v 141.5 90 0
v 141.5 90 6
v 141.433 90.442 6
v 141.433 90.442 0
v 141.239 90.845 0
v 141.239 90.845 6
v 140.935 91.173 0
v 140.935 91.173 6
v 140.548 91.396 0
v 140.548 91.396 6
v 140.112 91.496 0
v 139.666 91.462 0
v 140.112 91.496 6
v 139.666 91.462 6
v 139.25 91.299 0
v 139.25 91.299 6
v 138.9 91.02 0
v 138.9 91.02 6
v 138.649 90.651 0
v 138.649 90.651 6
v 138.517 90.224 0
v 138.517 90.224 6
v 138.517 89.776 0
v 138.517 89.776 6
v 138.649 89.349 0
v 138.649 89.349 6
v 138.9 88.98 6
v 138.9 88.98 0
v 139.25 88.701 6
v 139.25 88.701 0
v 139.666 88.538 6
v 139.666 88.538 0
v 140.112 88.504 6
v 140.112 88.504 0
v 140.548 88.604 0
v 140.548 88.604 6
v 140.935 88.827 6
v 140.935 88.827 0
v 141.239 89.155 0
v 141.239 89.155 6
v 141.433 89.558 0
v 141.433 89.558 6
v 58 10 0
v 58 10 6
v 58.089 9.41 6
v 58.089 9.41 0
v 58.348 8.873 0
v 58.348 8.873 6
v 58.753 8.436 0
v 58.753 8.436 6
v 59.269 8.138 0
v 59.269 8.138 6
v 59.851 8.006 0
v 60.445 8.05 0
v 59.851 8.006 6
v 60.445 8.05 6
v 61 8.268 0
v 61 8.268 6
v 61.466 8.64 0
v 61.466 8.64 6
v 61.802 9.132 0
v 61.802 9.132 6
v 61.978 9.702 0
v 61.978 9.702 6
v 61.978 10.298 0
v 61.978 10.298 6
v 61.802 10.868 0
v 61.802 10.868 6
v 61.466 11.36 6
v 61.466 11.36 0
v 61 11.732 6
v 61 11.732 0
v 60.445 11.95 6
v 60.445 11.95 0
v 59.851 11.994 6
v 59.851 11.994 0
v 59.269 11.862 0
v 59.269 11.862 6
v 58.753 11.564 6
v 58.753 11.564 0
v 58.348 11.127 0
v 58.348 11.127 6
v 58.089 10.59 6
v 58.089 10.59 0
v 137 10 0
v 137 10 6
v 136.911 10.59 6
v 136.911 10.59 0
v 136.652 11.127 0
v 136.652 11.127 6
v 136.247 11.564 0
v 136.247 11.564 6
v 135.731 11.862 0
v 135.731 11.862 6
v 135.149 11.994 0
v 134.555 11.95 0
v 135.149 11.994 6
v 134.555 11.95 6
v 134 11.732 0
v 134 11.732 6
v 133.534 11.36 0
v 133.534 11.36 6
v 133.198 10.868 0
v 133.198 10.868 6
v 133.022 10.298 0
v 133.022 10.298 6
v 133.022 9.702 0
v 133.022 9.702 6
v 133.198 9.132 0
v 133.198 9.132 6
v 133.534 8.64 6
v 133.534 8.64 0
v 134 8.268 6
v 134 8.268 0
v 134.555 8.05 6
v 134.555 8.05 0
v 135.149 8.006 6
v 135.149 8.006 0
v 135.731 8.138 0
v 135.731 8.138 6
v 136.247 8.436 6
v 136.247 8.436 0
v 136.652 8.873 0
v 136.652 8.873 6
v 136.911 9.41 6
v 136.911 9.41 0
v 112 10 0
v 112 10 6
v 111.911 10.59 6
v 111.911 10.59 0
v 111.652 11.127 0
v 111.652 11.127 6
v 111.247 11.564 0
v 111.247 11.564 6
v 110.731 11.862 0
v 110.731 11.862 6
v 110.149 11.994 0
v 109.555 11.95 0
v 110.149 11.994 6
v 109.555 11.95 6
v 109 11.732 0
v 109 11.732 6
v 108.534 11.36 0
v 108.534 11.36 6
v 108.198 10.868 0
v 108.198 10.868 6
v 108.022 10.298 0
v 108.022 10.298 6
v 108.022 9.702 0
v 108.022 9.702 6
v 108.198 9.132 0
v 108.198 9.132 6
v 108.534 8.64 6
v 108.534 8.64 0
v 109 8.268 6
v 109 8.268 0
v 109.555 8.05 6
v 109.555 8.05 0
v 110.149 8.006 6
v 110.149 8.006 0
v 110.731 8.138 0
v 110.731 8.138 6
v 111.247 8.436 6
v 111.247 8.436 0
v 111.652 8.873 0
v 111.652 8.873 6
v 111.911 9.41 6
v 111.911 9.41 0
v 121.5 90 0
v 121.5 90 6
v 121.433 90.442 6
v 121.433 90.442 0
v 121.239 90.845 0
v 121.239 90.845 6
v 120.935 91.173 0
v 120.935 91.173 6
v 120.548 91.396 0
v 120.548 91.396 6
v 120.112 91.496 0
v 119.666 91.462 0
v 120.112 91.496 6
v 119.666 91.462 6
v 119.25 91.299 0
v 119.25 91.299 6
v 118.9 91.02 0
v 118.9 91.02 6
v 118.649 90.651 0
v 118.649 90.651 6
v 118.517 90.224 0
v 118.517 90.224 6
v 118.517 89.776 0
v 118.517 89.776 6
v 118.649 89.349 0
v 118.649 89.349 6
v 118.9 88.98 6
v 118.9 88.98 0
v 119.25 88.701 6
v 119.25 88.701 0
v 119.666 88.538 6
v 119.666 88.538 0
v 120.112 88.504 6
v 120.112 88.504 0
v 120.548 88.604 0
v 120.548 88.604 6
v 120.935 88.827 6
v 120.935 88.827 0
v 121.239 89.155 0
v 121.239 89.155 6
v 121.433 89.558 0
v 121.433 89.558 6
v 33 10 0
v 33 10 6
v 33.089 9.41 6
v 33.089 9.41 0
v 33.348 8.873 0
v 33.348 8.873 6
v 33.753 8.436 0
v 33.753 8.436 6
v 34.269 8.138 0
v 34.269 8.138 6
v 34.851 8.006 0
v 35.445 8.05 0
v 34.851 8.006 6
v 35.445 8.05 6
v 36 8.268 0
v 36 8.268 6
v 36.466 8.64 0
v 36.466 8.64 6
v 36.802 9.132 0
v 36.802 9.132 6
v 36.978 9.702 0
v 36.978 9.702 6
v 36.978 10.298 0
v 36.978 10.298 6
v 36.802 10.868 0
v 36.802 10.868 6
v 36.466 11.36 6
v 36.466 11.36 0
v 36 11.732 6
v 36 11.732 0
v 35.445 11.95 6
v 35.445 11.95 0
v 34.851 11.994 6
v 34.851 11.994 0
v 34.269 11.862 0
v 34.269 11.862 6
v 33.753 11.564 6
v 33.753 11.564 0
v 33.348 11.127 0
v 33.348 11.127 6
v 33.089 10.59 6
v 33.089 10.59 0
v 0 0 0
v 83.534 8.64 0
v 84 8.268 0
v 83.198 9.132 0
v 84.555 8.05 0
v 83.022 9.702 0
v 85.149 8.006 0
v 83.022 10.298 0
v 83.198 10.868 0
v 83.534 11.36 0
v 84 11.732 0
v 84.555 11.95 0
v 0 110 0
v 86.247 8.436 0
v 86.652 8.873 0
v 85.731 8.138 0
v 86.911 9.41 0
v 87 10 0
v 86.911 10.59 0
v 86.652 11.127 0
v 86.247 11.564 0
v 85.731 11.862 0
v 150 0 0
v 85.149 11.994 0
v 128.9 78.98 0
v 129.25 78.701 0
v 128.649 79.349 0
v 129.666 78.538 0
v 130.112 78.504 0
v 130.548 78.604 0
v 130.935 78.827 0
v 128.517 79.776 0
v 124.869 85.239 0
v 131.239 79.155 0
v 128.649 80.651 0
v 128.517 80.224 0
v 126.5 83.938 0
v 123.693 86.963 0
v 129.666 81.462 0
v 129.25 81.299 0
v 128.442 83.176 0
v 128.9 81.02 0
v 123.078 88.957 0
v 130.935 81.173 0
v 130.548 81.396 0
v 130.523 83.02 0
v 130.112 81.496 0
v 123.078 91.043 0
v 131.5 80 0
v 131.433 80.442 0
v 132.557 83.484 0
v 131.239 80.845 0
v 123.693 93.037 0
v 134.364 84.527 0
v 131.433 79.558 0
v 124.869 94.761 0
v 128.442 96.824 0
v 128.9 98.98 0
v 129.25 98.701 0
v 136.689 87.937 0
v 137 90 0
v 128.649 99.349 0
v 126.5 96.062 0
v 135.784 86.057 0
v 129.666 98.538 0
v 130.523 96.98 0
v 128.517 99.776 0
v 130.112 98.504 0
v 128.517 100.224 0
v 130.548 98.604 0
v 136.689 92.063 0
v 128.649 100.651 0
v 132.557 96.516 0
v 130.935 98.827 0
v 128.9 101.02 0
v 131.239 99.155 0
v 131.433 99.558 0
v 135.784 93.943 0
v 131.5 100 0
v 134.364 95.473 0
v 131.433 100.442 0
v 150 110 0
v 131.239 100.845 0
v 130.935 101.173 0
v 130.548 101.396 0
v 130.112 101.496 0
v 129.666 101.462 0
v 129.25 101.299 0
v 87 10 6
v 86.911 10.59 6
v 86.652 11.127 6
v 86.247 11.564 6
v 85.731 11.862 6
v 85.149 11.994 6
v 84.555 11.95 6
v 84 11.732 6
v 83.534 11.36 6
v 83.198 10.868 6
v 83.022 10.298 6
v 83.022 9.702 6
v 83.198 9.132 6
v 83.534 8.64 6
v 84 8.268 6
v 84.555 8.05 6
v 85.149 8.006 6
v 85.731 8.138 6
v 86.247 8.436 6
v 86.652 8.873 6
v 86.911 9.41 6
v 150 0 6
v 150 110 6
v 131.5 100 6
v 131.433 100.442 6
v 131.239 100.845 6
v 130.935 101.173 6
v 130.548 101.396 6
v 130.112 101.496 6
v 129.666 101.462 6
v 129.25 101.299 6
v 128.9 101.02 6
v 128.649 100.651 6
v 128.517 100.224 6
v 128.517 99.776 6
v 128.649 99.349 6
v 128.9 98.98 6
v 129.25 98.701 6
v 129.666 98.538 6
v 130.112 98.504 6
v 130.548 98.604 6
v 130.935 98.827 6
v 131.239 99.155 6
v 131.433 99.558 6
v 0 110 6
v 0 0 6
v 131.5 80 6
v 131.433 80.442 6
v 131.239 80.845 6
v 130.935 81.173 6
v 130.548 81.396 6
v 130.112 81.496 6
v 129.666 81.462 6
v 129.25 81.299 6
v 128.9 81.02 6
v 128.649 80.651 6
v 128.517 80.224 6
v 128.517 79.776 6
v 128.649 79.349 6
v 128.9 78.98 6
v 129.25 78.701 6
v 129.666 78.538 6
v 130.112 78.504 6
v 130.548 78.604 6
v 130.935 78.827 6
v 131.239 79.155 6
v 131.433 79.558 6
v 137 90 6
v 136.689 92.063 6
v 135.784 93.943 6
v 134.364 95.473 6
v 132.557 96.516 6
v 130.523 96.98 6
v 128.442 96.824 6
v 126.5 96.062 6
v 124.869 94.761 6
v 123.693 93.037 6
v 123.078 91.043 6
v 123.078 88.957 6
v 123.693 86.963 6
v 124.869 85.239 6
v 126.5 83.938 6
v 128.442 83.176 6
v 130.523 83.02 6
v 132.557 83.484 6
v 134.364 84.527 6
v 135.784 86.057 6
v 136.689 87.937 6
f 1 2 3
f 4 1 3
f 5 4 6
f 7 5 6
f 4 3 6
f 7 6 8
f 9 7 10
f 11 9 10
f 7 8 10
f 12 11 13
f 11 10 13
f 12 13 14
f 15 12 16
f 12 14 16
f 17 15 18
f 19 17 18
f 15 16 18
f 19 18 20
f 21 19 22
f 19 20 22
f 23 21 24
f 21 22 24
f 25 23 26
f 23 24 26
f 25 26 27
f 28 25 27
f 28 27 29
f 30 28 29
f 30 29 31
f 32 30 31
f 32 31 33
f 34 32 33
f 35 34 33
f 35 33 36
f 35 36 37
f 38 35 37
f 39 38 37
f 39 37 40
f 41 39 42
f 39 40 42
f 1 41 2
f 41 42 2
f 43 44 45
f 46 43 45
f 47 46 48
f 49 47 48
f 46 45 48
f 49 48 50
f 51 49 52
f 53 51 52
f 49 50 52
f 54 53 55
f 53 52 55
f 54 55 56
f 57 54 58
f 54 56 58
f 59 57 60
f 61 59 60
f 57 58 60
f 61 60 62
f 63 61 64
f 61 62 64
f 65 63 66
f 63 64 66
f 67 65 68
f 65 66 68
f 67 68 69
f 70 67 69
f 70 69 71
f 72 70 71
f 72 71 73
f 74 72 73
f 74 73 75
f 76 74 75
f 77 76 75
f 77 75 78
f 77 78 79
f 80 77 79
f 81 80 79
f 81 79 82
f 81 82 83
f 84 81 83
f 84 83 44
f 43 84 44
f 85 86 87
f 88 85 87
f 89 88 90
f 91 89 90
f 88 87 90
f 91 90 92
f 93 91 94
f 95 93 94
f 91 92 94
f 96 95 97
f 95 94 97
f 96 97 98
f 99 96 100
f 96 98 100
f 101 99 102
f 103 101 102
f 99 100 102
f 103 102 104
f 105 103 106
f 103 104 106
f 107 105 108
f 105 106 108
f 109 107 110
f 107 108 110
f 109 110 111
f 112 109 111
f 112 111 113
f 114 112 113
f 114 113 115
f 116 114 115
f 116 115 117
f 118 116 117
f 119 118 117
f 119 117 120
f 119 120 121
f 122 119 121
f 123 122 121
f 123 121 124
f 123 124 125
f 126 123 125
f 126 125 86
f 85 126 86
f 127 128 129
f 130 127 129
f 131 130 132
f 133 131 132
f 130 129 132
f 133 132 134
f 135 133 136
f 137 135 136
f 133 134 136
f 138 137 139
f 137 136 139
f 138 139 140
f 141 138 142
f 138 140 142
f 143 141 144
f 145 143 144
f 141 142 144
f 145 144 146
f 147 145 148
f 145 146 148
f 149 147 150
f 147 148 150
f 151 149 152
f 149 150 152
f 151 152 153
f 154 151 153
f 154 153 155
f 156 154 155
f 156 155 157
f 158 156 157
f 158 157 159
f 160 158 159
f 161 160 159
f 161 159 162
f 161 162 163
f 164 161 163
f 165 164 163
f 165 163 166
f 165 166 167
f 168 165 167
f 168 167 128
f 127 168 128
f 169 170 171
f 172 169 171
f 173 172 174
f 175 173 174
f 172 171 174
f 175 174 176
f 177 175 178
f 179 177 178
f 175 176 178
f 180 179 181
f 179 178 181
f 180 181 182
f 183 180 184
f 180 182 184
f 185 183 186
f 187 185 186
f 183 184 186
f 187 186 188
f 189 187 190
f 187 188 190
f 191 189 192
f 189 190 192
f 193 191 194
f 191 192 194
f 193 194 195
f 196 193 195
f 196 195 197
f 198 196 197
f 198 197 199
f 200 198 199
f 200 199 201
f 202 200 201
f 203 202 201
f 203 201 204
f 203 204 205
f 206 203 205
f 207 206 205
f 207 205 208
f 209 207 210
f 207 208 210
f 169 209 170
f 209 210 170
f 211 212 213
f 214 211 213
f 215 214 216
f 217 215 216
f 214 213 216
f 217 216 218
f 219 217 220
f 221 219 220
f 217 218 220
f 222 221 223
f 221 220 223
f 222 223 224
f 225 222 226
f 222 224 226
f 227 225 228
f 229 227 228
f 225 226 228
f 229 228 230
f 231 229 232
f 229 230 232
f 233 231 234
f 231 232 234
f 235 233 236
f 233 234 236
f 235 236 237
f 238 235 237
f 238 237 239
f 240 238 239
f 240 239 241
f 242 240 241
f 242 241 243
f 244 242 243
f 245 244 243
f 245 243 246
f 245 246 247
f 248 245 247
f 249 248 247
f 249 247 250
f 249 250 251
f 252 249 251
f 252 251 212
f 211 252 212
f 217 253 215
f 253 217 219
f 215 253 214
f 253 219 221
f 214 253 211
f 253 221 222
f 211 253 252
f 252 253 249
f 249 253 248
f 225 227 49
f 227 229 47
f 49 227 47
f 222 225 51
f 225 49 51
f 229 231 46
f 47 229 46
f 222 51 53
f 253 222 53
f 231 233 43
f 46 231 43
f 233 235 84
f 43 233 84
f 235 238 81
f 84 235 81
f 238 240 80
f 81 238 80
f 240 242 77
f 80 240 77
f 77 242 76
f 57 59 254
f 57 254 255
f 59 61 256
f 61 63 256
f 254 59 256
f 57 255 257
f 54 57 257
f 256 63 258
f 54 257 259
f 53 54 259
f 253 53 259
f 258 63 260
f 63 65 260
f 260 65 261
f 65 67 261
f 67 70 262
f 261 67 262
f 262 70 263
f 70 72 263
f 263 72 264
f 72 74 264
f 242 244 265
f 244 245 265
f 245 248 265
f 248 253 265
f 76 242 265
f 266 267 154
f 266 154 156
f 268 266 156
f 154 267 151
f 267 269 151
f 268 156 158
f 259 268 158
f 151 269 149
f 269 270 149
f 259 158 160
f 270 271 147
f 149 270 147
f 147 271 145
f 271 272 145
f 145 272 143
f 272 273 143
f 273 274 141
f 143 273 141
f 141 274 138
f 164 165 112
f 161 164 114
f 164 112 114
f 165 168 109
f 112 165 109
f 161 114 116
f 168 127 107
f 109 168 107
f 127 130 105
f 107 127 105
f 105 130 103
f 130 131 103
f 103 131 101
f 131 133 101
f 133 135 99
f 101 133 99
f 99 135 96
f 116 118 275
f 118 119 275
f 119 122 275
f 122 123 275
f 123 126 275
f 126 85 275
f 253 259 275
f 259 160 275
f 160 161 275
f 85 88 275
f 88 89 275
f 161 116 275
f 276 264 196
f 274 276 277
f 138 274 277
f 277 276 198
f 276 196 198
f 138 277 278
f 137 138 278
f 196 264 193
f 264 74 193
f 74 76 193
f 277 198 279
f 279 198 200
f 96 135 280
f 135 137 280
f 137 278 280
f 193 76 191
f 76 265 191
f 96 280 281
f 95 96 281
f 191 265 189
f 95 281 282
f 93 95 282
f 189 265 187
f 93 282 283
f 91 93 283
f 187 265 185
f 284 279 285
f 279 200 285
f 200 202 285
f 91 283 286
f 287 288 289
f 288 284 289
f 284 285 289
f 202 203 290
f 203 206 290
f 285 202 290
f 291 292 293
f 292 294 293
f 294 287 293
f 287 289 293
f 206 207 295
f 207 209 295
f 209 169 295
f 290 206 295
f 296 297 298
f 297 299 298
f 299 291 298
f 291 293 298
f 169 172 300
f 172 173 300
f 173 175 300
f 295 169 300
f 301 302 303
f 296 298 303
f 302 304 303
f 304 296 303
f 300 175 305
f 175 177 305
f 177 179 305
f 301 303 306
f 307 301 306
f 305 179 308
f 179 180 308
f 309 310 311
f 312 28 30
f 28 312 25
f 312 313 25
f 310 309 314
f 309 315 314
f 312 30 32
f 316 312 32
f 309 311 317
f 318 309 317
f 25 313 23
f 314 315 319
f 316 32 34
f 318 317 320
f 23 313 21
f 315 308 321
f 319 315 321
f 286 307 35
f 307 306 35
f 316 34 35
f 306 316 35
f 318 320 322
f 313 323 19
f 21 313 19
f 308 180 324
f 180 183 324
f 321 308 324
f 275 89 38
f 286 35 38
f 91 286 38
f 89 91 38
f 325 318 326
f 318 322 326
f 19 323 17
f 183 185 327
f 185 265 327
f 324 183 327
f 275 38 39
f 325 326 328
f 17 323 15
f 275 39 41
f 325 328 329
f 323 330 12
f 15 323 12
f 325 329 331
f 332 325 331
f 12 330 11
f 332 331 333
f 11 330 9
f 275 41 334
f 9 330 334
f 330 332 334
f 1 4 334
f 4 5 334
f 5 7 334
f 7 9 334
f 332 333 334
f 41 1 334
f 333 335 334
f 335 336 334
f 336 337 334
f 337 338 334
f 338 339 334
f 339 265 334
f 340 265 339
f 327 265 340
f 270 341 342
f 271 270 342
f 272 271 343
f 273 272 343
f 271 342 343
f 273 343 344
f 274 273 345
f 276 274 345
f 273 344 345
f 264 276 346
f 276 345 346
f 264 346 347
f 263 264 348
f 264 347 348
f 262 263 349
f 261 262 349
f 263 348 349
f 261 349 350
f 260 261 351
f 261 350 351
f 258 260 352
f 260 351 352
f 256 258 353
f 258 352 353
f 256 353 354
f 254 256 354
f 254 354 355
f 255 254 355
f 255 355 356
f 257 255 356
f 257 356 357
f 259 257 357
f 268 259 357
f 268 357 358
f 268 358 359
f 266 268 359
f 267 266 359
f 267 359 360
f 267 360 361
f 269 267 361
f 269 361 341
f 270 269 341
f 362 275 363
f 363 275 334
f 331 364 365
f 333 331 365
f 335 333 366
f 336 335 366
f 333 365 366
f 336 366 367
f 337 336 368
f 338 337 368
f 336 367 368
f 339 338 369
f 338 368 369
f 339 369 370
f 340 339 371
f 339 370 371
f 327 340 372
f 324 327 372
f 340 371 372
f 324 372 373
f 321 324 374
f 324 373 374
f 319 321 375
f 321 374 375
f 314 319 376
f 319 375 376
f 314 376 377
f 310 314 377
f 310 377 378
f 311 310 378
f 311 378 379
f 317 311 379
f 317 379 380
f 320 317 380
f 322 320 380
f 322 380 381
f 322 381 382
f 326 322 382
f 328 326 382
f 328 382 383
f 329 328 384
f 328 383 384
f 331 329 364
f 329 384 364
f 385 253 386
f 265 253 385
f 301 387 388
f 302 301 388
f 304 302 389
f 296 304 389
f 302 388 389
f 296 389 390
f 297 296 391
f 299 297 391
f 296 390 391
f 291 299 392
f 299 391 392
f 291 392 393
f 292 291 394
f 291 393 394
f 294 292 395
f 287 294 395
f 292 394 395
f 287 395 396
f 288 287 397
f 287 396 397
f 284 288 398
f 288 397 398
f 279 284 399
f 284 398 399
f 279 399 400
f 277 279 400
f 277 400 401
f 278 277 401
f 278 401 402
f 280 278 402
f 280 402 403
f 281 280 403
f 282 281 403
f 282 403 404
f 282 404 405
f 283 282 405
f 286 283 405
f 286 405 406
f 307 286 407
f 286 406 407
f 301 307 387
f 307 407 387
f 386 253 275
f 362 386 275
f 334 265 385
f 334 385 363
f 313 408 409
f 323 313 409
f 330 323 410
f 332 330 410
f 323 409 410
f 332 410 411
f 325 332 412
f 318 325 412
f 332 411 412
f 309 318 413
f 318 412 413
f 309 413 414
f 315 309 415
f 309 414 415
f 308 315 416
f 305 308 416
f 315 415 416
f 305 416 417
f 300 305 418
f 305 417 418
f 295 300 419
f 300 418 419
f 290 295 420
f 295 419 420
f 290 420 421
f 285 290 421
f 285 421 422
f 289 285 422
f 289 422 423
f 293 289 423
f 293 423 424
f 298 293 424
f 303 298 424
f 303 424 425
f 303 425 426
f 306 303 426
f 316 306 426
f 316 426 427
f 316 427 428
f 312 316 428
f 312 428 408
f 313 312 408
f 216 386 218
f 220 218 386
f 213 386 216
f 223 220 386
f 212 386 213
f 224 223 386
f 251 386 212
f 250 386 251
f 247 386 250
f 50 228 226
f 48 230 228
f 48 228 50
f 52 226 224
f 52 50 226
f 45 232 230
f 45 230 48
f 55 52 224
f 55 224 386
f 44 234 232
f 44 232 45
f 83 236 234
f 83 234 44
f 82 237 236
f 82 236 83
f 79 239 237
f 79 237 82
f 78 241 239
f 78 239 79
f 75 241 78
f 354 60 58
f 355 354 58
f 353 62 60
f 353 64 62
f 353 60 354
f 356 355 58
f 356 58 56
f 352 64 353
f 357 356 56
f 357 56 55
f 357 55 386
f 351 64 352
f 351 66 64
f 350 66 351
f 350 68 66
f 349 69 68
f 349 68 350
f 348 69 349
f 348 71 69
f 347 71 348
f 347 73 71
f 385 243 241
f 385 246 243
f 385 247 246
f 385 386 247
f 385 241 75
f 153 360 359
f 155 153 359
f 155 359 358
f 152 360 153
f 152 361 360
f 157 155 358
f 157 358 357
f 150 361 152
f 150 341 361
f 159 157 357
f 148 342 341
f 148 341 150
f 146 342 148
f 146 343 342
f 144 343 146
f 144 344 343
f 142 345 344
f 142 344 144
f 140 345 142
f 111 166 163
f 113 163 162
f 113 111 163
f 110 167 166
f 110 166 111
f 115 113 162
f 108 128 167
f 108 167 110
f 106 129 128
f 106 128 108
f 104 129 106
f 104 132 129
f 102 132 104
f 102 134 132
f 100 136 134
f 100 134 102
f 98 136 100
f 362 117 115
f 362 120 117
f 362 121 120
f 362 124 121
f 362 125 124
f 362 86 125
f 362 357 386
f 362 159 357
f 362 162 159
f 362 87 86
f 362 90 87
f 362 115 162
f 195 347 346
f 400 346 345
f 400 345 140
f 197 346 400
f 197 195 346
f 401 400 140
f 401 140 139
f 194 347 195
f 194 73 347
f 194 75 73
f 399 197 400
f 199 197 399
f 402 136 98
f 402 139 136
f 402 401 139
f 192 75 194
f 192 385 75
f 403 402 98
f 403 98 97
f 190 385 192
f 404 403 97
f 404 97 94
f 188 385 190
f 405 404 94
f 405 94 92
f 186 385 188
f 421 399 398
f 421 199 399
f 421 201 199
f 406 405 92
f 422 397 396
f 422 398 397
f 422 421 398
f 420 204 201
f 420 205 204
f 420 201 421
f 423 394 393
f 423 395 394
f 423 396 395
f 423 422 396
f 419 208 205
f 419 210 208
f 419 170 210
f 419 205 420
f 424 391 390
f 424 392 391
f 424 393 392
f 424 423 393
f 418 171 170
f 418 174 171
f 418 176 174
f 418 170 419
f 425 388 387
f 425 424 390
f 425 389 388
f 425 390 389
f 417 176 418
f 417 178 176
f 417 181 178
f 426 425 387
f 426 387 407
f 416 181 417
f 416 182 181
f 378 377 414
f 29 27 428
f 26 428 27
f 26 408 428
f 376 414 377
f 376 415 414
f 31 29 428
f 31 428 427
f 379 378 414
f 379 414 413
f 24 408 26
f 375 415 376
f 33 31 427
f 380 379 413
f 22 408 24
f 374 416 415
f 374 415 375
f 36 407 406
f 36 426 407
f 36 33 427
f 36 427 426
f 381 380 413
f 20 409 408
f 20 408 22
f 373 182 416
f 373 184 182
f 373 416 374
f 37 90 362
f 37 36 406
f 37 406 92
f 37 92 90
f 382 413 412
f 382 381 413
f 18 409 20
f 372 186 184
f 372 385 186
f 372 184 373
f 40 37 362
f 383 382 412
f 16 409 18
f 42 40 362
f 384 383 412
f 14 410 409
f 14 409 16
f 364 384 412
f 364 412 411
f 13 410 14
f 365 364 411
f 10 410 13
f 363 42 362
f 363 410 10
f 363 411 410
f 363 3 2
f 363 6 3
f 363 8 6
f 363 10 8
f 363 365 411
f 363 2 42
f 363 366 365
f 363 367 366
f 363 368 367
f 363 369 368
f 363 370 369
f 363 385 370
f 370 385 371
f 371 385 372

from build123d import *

# Parameters (mm, degrees)
ESQUISSE1_W             = 150
ESQUISSE1_H             = 110
BOSS_EXTRU_1_DEPTH      = 6
ESQUISSE2_R             = 2
ENL_V_MAT_EXTRU_1_DEPTH = 187.107495819
ESQUISSE3_R             = 7
ENL_V_MAT_EXTRU_2_DEPTH = 187.107495819
ESQUISSE4_R             = 1.5
ENL_V_MAT_EXTRU_3_DEPTH = 6


with BuildPart() as part:
    # Esquisse1 → Boss.-Extru.1 (new body)
    with BuildSketch(Plane.XY):
        with Locations((75, 55)):
            Rectangle(ESQUISSE1_W, ESQUISSE1_H)
    extrude(amount=BOSS_EXTRU_1_DEPTH)

    # Esquisse2 → Enlèv. mat.-Extru.1 (cut, through all)
    with BuildSketch(Plane.XY.offset(6)):
        with Locations((110, 10)):
            Circle(ESQUISSE2_R)
        with Locations((135, 10)):
            Circle(ESQUISSE2_R)
        with Locations(Location((35, 10, 0), (0, 0, 180))):
            Circle(ESQUISSE2_R)
        with Locations(Location((60, 10, 0), (0, 0, 180))):
            Circle(ESQUISSE2_R)
        with Locations((85, 10)):
            Circle(ESQUISSE2_R)
    extrude(amount=-ENL_V_MAT_EXTRU_1_DEPTH, mode=Mode.SUBTRACT)

    # Esquisse3 → Enlèv. mat.-Extru.2 (cut, through all)
    with BuildSketch(Plane.XY.offset(6)):
        with Locations((130, 90)):
            Circle(ESQUISSE3_R)
    extrude(amount=-ENL_V_MAT_EXTRU_2_DEPTH, mode=Mode.SUBTRACT)

    # Esquisse4 → Enlèv. mat.-Extru.3 (cut)
    with BuildSketch(Plane.XY.offset(6)):
        with Locations((130, 100)):
            Circle(ESQUISSE4_R)
        with Locations((140, 90)):
            Circle(ESQUISSE4_R)
        with Locations((130, 80)):
            Circle(ESQUISSE4_R)
        with Locations((120, 90)):
            Circle(ESQUISSE4_R)
    extrude(amount=-ENL_V_MAT_EXTRU_3_DEPTH, mode=Mode.SUBTRACT)


solid = part.part
